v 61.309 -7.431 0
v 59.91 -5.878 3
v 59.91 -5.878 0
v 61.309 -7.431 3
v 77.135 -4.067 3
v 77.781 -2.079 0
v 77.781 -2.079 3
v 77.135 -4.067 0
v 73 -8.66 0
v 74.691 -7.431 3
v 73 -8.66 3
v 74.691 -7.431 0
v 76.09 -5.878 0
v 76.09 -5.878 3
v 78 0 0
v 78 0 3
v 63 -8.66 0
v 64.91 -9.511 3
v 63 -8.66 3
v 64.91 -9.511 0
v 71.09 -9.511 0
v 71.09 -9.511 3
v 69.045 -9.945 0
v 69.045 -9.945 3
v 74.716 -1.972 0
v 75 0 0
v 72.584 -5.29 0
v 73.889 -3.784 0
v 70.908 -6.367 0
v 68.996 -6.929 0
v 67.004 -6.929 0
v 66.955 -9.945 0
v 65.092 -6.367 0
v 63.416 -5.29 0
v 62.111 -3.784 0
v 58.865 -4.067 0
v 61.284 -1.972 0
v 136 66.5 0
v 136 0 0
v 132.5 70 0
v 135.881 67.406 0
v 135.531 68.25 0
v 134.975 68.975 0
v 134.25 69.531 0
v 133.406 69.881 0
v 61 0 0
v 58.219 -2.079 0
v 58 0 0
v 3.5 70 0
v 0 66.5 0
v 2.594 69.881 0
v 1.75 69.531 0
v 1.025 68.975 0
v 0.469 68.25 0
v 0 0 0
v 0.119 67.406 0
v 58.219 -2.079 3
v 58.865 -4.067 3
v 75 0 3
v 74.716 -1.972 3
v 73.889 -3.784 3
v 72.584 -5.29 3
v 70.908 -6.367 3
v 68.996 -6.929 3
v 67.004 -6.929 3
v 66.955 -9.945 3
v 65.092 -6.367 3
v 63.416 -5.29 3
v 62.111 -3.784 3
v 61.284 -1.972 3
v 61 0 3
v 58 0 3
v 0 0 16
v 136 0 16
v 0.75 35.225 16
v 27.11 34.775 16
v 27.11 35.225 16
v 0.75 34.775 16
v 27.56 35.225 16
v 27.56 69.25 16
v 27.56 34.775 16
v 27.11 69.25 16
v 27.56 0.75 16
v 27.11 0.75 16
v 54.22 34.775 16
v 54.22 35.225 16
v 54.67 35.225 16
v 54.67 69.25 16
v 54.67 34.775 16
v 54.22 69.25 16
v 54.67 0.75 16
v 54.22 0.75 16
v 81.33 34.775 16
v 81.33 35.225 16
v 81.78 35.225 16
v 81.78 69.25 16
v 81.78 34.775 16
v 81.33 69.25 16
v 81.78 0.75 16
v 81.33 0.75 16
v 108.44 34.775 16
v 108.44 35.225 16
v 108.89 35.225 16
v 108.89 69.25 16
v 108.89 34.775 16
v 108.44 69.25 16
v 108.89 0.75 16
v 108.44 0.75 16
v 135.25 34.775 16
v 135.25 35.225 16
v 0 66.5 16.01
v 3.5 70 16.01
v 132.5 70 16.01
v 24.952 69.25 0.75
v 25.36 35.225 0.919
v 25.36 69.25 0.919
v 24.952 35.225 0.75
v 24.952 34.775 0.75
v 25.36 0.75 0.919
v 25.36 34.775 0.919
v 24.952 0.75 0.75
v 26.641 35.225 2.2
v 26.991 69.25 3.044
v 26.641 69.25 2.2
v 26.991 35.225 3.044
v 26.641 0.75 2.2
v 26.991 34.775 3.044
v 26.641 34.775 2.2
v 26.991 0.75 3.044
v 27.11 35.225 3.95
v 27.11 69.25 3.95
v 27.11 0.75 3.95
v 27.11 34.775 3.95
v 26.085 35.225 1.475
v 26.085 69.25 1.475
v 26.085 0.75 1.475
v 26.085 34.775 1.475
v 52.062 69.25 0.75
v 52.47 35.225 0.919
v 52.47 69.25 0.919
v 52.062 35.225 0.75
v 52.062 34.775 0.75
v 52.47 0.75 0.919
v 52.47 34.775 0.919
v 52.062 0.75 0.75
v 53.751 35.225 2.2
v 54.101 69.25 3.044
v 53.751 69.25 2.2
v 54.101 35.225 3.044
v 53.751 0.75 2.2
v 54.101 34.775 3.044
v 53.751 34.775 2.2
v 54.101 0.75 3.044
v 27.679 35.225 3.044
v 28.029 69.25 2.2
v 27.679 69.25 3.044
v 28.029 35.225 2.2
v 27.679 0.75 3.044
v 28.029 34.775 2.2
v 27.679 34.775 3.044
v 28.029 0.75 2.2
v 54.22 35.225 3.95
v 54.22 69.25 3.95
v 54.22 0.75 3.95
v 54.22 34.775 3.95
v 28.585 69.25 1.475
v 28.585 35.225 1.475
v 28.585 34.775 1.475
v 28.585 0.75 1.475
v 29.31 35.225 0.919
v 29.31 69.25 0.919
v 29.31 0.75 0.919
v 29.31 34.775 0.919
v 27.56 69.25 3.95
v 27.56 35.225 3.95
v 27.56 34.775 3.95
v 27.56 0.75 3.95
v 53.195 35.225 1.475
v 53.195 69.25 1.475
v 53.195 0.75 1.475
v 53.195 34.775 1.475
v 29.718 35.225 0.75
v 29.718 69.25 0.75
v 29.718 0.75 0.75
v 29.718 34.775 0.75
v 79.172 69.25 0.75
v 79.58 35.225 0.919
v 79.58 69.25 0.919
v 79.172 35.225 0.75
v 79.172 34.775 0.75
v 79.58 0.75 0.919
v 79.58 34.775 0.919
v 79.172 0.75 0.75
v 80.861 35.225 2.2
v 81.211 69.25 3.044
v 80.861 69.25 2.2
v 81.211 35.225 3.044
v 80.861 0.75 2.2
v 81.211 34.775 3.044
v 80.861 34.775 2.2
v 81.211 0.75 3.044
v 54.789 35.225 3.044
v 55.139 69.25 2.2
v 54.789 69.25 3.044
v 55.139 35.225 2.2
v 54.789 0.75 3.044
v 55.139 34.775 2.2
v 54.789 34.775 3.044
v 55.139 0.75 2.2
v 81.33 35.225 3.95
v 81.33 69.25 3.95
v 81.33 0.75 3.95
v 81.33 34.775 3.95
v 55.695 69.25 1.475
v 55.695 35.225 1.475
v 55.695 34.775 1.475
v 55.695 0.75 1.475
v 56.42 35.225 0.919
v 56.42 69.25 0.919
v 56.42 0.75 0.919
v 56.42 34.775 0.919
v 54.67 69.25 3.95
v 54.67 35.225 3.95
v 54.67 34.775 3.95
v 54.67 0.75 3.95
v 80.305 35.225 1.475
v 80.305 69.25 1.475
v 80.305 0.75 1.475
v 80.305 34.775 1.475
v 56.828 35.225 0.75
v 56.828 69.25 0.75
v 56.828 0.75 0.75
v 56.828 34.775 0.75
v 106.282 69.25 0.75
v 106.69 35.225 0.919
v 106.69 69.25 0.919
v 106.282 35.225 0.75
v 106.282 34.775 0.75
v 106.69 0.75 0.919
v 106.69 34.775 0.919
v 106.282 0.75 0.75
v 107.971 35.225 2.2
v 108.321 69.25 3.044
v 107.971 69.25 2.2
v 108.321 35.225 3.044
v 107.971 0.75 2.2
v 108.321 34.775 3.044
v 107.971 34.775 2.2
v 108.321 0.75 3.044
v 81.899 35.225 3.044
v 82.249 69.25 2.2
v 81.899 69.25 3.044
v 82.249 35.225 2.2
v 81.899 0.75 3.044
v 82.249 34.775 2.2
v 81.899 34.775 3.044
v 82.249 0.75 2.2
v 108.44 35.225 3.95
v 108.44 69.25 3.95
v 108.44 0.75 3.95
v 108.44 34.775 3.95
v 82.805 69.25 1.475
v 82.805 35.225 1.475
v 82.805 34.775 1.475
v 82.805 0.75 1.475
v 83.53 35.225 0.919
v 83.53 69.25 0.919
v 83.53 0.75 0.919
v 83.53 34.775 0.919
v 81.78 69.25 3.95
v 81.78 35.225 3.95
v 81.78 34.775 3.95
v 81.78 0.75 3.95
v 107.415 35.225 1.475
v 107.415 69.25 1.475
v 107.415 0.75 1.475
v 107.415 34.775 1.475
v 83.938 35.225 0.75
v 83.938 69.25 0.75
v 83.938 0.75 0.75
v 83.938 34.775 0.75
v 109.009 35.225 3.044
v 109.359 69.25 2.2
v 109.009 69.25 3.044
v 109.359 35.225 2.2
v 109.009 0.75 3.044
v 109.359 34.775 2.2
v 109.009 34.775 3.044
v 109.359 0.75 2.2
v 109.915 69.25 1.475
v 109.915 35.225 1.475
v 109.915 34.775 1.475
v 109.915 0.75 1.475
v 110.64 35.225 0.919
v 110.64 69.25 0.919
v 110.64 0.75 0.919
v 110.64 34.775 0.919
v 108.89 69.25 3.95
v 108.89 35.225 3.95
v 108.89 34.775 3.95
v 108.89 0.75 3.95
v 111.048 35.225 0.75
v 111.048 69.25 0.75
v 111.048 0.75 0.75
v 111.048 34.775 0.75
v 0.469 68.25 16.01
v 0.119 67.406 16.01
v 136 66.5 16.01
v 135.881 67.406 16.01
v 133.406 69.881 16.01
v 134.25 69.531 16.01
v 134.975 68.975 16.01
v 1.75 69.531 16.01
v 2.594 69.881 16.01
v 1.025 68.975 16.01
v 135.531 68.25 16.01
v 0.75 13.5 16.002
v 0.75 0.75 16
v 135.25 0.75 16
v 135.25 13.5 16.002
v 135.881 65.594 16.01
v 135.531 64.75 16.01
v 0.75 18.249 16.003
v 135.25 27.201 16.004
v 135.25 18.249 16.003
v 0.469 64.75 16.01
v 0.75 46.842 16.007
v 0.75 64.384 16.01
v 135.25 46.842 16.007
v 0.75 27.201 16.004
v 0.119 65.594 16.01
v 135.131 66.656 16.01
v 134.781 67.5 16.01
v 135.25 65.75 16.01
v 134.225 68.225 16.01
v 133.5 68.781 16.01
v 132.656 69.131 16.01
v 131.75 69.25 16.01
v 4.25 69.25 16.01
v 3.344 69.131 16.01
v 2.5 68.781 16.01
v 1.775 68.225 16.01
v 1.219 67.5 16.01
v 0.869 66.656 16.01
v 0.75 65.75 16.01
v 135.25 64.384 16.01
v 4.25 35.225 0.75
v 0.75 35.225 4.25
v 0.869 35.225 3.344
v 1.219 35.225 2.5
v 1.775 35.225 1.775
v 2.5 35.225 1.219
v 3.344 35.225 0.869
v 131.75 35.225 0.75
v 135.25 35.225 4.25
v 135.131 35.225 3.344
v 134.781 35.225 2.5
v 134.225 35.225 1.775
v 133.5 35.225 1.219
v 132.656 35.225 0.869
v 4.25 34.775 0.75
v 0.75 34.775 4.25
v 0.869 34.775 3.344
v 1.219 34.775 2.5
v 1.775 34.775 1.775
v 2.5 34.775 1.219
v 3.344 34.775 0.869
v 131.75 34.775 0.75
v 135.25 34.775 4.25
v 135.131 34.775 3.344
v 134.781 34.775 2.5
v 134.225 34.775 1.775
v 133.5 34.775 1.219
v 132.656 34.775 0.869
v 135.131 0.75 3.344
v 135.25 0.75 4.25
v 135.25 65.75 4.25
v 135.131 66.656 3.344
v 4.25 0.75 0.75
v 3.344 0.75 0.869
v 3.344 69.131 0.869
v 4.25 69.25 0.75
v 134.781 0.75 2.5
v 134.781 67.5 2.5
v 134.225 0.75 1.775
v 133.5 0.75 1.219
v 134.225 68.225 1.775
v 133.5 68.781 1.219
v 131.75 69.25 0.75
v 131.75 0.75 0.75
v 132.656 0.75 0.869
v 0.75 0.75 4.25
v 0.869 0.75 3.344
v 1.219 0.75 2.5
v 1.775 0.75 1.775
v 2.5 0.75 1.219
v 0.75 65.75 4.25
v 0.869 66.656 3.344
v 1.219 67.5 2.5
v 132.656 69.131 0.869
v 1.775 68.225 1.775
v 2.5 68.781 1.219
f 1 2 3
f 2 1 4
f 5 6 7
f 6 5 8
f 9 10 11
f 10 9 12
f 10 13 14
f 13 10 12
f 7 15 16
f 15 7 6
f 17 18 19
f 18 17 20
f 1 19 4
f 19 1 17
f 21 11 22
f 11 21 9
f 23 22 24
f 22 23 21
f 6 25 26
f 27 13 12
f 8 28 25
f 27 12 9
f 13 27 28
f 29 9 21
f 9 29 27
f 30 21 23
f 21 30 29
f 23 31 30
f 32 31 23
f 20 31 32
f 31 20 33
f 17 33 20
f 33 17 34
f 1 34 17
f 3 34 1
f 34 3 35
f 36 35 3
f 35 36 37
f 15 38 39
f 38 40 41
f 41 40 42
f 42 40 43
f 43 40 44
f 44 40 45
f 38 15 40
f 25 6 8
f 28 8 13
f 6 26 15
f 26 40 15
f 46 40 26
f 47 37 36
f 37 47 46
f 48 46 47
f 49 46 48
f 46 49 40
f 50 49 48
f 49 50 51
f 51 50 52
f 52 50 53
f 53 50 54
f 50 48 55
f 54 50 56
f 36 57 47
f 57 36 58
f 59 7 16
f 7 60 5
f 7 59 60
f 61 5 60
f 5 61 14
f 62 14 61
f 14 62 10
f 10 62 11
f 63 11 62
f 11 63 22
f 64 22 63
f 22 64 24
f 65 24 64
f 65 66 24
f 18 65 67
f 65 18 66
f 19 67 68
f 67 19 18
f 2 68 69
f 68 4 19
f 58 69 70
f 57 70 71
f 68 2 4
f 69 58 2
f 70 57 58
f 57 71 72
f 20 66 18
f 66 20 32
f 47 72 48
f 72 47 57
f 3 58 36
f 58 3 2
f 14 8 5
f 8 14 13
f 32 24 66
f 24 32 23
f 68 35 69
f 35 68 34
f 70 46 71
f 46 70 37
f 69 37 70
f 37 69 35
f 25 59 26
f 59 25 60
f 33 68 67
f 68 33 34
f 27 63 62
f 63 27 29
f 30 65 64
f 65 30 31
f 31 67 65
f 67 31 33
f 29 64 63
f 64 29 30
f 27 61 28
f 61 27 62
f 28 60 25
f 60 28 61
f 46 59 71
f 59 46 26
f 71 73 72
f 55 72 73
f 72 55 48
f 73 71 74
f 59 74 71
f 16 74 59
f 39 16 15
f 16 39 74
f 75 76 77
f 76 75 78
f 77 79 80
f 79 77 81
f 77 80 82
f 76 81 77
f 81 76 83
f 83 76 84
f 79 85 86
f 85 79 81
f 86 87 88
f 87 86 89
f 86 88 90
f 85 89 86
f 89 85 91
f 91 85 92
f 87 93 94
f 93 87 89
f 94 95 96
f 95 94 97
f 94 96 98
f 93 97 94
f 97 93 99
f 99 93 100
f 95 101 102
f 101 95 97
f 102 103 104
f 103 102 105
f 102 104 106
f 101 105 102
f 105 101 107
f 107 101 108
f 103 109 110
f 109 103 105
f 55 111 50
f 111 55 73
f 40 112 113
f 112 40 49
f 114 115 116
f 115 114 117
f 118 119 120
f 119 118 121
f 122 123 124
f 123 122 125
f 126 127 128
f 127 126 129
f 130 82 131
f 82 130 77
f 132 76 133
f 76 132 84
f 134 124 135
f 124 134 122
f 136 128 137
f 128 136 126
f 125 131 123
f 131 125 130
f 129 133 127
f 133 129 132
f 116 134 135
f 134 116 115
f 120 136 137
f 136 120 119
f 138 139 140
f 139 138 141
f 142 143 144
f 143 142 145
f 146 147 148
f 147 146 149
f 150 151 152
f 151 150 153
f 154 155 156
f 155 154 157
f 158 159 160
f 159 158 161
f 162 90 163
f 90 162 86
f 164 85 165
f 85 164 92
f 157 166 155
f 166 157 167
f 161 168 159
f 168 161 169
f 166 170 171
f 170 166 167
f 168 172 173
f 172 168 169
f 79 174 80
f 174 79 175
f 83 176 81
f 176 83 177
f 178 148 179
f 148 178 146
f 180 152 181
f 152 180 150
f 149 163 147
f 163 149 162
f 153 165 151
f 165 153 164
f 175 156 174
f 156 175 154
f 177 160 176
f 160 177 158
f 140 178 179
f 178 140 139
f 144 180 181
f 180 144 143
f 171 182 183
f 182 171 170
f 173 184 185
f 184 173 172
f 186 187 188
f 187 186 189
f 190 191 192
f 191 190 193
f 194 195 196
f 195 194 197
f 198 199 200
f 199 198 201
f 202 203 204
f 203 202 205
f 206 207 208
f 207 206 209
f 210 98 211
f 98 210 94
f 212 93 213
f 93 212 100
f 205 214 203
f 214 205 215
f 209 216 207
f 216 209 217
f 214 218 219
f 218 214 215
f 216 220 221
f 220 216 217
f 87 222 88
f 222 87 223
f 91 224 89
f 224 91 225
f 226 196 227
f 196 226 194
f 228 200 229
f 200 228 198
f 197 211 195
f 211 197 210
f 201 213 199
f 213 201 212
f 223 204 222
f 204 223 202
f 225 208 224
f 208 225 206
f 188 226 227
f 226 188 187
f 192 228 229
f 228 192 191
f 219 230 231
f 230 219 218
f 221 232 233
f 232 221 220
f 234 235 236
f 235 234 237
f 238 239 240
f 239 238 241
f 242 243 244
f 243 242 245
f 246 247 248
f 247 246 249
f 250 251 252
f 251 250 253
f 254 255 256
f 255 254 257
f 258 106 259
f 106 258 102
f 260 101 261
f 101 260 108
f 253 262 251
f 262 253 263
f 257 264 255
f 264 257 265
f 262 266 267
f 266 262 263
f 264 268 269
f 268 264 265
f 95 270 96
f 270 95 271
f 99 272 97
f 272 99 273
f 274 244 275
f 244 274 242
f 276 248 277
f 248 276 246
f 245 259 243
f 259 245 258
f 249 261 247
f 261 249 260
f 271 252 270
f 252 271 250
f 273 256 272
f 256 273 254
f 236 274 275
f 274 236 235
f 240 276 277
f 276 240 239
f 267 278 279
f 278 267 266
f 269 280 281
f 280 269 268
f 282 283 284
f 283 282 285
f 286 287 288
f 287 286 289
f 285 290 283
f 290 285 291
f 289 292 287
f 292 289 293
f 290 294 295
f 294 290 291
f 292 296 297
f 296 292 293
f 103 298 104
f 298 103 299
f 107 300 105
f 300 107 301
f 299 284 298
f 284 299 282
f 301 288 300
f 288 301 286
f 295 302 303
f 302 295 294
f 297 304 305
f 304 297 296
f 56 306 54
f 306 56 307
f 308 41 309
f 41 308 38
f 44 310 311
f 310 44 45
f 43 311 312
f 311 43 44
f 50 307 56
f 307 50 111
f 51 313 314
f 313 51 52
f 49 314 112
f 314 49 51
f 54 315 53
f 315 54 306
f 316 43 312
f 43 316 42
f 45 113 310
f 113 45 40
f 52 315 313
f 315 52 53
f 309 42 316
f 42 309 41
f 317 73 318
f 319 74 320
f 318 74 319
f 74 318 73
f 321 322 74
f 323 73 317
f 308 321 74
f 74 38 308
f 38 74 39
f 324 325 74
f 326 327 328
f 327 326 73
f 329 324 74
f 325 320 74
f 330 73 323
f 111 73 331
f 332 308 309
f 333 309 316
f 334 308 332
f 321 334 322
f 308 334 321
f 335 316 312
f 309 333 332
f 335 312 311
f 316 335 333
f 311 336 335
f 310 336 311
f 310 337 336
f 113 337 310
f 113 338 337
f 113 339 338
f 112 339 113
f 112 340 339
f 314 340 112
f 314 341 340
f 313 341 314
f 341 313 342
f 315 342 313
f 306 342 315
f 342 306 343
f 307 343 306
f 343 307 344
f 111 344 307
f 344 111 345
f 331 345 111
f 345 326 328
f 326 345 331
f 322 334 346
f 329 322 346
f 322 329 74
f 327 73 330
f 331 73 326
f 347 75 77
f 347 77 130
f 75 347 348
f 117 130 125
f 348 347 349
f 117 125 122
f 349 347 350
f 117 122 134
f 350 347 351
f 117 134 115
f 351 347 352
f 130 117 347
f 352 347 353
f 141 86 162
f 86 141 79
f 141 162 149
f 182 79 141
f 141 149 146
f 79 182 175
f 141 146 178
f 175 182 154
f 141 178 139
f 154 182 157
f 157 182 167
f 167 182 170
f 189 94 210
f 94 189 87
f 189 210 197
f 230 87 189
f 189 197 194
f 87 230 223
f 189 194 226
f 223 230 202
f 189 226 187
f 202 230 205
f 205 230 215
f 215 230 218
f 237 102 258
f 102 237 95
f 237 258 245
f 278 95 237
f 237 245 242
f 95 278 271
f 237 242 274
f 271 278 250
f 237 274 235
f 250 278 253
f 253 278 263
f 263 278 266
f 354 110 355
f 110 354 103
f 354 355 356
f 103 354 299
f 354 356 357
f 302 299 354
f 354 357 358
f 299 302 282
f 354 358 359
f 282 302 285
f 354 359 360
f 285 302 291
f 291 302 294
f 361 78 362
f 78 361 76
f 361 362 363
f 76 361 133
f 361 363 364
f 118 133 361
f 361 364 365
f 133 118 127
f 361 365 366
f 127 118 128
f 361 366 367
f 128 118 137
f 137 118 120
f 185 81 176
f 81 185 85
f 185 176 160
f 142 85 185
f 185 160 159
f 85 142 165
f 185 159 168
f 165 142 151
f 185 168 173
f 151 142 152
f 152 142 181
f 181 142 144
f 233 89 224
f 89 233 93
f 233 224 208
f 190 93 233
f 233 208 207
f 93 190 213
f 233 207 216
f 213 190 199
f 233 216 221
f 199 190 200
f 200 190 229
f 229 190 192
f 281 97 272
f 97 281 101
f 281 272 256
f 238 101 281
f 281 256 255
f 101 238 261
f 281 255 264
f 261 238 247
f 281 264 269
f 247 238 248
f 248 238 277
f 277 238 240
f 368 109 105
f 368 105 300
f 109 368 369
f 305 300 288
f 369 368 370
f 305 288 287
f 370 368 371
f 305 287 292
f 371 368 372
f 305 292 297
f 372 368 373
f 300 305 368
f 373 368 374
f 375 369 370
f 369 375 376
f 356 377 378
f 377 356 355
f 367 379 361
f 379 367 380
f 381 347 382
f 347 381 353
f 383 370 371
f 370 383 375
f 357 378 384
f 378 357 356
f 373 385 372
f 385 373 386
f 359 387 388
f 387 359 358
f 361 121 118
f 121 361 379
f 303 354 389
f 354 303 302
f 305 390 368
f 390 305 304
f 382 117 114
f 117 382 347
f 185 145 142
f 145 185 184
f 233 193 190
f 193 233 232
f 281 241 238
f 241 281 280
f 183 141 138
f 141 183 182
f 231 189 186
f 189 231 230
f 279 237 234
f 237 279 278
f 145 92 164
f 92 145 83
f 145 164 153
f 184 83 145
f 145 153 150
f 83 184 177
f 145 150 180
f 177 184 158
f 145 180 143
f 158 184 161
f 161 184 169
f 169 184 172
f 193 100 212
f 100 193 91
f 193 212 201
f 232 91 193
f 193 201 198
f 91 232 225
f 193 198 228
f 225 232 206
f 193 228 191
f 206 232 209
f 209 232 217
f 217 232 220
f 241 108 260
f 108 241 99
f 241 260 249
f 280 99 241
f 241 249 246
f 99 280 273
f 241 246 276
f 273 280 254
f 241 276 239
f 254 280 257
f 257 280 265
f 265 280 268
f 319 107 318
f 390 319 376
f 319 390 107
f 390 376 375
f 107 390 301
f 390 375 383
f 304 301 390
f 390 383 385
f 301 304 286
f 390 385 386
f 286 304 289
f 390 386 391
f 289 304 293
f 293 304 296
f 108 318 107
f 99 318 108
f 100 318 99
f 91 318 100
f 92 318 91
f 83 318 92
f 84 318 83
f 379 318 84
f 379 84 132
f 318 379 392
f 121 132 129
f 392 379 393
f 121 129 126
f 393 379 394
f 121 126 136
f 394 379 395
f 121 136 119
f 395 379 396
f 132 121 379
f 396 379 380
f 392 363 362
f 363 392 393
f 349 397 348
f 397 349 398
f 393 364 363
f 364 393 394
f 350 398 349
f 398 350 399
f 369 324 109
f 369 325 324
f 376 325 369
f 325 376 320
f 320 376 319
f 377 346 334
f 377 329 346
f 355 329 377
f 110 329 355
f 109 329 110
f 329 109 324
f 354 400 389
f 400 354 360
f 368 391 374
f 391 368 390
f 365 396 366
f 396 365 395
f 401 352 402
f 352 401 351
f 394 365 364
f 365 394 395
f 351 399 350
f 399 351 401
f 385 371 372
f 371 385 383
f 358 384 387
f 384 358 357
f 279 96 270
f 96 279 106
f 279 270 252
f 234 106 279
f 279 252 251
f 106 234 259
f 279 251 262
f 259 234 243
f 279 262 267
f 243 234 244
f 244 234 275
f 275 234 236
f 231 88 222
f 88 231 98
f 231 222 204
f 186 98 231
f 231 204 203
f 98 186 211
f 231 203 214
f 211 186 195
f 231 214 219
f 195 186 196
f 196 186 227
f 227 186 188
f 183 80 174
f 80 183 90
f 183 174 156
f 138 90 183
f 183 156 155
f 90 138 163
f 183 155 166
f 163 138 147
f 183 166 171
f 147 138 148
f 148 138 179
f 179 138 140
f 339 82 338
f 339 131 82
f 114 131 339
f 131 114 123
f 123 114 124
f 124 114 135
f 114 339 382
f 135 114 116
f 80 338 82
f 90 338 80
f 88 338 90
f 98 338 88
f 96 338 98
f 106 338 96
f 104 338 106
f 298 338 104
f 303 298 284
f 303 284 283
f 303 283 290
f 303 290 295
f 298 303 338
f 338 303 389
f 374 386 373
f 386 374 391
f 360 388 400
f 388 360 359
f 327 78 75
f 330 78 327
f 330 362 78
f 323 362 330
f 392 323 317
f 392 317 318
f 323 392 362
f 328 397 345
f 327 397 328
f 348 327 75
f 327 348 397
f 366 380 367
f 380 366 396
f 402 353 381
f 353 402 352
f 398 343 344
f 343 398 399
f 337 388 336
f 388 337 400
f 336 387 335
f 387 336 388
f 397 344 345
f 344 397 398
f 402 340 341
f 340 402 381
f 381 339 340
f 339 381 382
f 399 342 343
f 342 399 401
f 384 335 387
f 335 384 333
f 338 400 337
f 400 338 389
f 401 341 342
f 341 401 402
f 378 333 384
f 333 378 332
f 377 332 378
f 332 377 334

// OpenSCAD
numberOfDrawerCompartmentsHorizontally = 5;
numberOfDrawerCompartmentsInDepth = 2;

// You can subdivide the drawer into two types of compartments by setting the right side width ratio to something bigger than zero.
rightSideWidthRatio = 0;
rightSideNumberOfDrawerCompartmentsHorizontally = 3;
rightSideNumberOfDrawerCompartmentsInDepth = 2;

numberOfDrawersInChest = 7;

generate = 1; // [0:chest, 1:drawer]

// Thickness
outerWall = 0.75;
// Thickness of main drawer walls and dividers running forward and back
drawerWall=0.45;
// Thickness of divider walls running horizontally
dividerWall=0.45;
drawerWidth = 136;
drawerDepth = 70;
drawerHeight = 16;
roundedCornerRadius=3.5;

tolerance=0.75;

// Divider walls between full-depth compartments can have a cut in them to make it easier to put things in and take them out. Set cut height to zero to disable.
cutHeight = 13.5;
cutLengthAtTop = 16;
cutLengthAtBottom = 8;
cutSmoothingSize = 5;

handleSize = 20;
handleLip = 3;
// Set to zero to have a handle with no floor.
handleFloorThickness = 0;

slideWidth = 6;
slideThickness = 1;

// Three of the walls are made in a grid pattern to save plastic. If you want them solid, set the grid hole width to zero.
gridHoleWidth = 9;
gridStripWidth = 3;
gridAngle = 60;

numberOfRearCrossbars = 2; // [0:0, 1:1, 2:2]


module end_of_parameters_dummy() {}

//use <Bezier.scad>;
/*
Copyright (c) 2017 Alexander R. Pruss.

Licensed under any Creative Commons Attribution license you like or under the
following MIT License.

Permission is hereby granted, free of charge, to any person obtaining a copy
of this software and associated documentation files (the "Software"), to deal
in the Software without restriction, including without limitation the rights
to use, copy, modify, merge, publish, distribute, sublicense, and/or sell
copies of the Software, and to permit persons to whom the Software is
furnished to do so, subject to the following conditions:

The above copyright notice and this permission notice shall be included in all
copies or substantial portions of the Software.

THE SOFTWARE IS PROVIDED "AS IS", WITHOUT WARRANTY OF ANY KIND, EXPRESS OR
IMPLIED, INCLUDING BUT NOT LIMITED TO THE WARRANTIES OF MERCHANTABILITY,
FITNESS FOR A PARTICULAR PURPOSE AND NONINFRINGEMENT. IN NO EVENT SHALL THE
AUTHORS OR COPYRIGHT HOLDERS BE LIABLE FOR ANY CLAIM, DAMAGES OR OTHER
LIABILITY, WHETHER IN AN ACTION OF CONTRACT, TORT OR OTHERWISE, ARISING FROM,
OUT OF OR IN CONNECTION WITH THE SOFTWARE OR THE USE OR OTHER DEALINGS IN THE
SOFTWARE.

*/


// Public domain Bezier stuff from www.thingiverse.com/thing:8443
function BEZ03(u) = pow((1-u), 3);
function BEZ13(u) = 3*u*(pow((1-u),2));
function BEZ23(u) = 3*(pow(u,2))*(1-u);
function BEZ33(u) = pow(u,3);
function PointAlongBez4(p0, p1, p2, p3, u) = [for (i=[0:len(p0)-1])
	BEZ03(u)*p0[i]+BEZ13(u)*p1[i]+BEZ23(u)*p2[i]+BEZ33(u)*p3[i]];
// End public domain Bezier stuff

function REPEAT_MIRRORED(v) = ["m",v];
function SMOOTH_REL(x) = ["r",x];
function SMOOTH_ABS(x) = ["a",x];
function SYMMETRIC() = ["r",1];
function OFFSET(v) = ["o",v];
function SHARP() = OFFSET([0,0,0]);
function POLAR(r,angle) = OFFSET(r*[cos(angle),sin(angle)]);
function POINT_IS_SPECIAL(v) = (v[0]=="r" || v[0]=="a" || v[0]=="o");

// this does NOT handle offset type points; to handle those, use DecodeBezierOffsets()
function getControlPoint(cp,node,otherCP) = cp[0]=="r"?(node+cp[1]*(node-otherCP)):( cp[0]=="a"?node+cp[1]*(node-otherCP)/norm(node-otherCP):cp );

function onLine2(a,b,c,eps=1e-4) =
    norm(c-a) <= eps ? true
        : norm(b-a) <= eps ? false /* to be safe */
            : abs((c[1]-a[1])*(b[0]-a[0]) - (b[1]-a[1])*(c[0]-a[0])) <= eps * eps && norm(c-a) <= eps + norm(b-a);

function isStraight2(p1,c1,c2,p2,eps=1e-4) =
    len(p1) == 2 &&
    onLine2(p1,p2,c1,eps=eps) && onLine2(p2,p1,c2,eps=eps);

function Bezier2(p,index=0,precision=0.05,rightEndPoint=true) = let(nPoints=ceil(1/precision))
    isStraight2(p[index],p[index+1],p[index+2],p[index+3]) ? (rightEndPoint?[p[index+0],p[index+3]]:[p[index+0]] ) :
    [for (i=[0:nPoints-(rightEndPoint?0:1)]) PointAlongBez4(p[index+0],p[index+1],p[index+2],p[index+3],i/nPoints)];

function flatten(listOfLists) = [ for(list = listOfLists) for(item = list) item ];


// p is a list of points, in the format:
// [node1,control1,control2,node2,control3, control4,node3, ...]
// You can replace inner control points with:
//   SYMMETRIC: uses a reflection of the control point on the other side of the node
//   SMOOTH_REL(x): like SYMMETRIC, but the distance of the control point to the node is x times the distance of the other control point to the node
//   SMOOTH_ABS(x): like SYMMETRIC, but the distance of the control point to the node is exactly x
// You can also replace any control point with:
//   OFFSET(v): puts the control point at the corresponding node plus the vector v
//   SHARP(): equivalent to OFFSET([0,0]); useful for straight lines
//   POLAR(r,angle): like OFFSET, except the offset is specified in polar coordinates

function DecodeBezierOffset(control,node) = control[0] == "o" ? node+control[1] : control;

function _mirrorMatrix(normalVector) = let(v = normalVector/norm(normalVector)) len(v)<3 ? [[1-2*v[0]*v[0],-2*v[0]*v[1]],[-2*v[0]*v[1],1-2*v[1]*v[1]]] : [[1-2*v[0]*v[0],-2*v[0]*v[1],-2*v[0]*v[2]],[-2*v[0]*v[1],1-2*v[1]*v[1],-2*v[1]*v[2]],[-2*v[0]*v[2],-2*v[1]*v[2],1-2*v[2]*v[2]]];

function _correctLength(p,start=0) =
    start >= len(p) || p[start][0] == "m" ? 3*floor(start/3)+1 : _correctLength(p,start=start+1);

function _trimArray(a, n) = [for (i=[0:n-1]) a[i]];

function _transformPoint(matrix,a) =
    let(n=len(a))
        len(matrix[0])==n+1 ?
            _trimArray(matrix * concat(a,[1]), n)
            : matrix * a;

function _transformPath(matrix,path) =
    [for (a=path) _transformPoint(matrix,a)];

function _reverseArray(array) = let(n=len(array)) [for (i=[0:n-1]) array[n-1-i]];

function _stitchPaths(a,b) = let(na=len(a)) [for (i=[0:na+len(b)-2]) i<na? a[i] : b[i-na+1]-b[0]+a[na-1]];

// replace all OFFSET/SHARP/POLAR points with coordinates
function DecodeBezierOffsets(p) = [for (i=[0:_correctLength(p)-1]) i%3==0?p[i]:(i%3==1?DecodeBezierOffset(p[i],p[i-1]):DecodeBezierOffset(p[i],p[i+1]))];

function _mirrorPaths(basePath, control, start) =
    control[start][0] == "m" ? _mirrorPaths(_stitchPaths(basePath,_reverseArray(_transformPath(_mirrorMatrix( control[start][1] ),basePath))), control, start+1) : basePath;

function DecodeSpecialBezierPoints(p0) =
    let(
        l = _correctLength(p0),
        doMirror = len(p0)>l && p0[l][0] == "m",
        p=DecodeBezierOffsets(p0),
        basePath = [for (i=[0:l-1]) i%3==0?p[i]:(i%3==1?getControlPoint(p[i],p[i-1],p[i-2]):getControlPoint(p[i],p[i+1],p[i+2]))])
        doMirror ? _mirrorPaths(basePath, p0, l) : basePath;

function Distance2D(a,b) = sqrt((a[0]-b[0])*(a[0]-b[0])+(a[1]-b[1])*(a[1]-b[1]));

function RemoveDuplicates(p,eps=0.00001) = let(safeEps = eps/len(p)) [for (i=[0:len(p)-1]) if(i==0 || i==len(p)-1 || Distance2D(p[i-1],p[i]) >= safeEps) p[i]];

function Bezier(p,precision=0.05,eps=0.00001) = let(q=DecodeSpecialBezierPoints(p), nodes=(len(q)-1)/3) RemoveDuplicates(flatten([for (i=[0:nodes-1]) Bezier2(q,index=i*3,precision=precision,rightEndPoint=(i==nodes-1))]),eps=eps);

module BezierVisualize(p,precision=0.05,eps=0.00001,lineThickness=0.25,controlLineThickness=0.125,nodeSize=1) {
    $fn = 16;
    dim = len(p[0]);
    module point(size) {
        if (dim==2)
            circle(d=size);
        else
            sphere(d=size);
    }
    p1 = DecodeSpecialBezierPoints(p);
    l = Bezier(p1,precision=precision,eps=eps);
    for (i=[0:len(l)-2]) {
        hull() {
            translate(l[i]) point(lineThickness);
            translate(l[i+1]) point(lineThickness);
        }
    }
    for (i=[0:len(p1)-1]) {
        if (i%3 == 0) {
            color("black") translate(p1[i]) point(nodeSize);
        }
        else {
            node = i%3 == 1 ? i-1 : i+1;
            color("red") translate(p1[i]) point(nodeSize);
            color("red") hull() {
                translate(p1[node]) point(controlLineThickness);
                translate(p1[i]) point(controlLineThickness);
            }
        }
    }
}



module dummy() {}
nudge = 0.01;

module compartment(width, drawerDepth, drawerHeight,drawerWall=drawerWall) {
    render(convexity=2)
    difference() {
        cube([width,drawerDepth,drawerHeight]);
        hull() {
            translate([drawerWall,drawerWall,roundedCornerRadius+drawerWall]) cube([width-2*drawerWall,drawerDepth-2*drawerWall,drawerHeight]);
            translate([0,drawerWall,roundedCornerRadius+drawerWall])
                rotate([-90,0,0]) {
                translate([drawerWall+roundedCornerRadius,0,0]) cylinder(h=drawerDepth-2*drawerWall,r=roundedCornerRadius,$fn=24);
                translate([width-drawerWall-roundedCornerRadius,0,0]) cylinder(h=drawerDepth-2*drawerWall,r=roundedCornerRadius,$fn=24);
                }
            }
    }
}

module drawerHull(drawerWidth,inset=0,drawerHeight=drawerHeight,roundOnLeft=true,roundOnRight=true) {

    module post(roundPost) {
       if (roundPost)
           cylinder(h=drawerHeight+nudge,r=roundedCornerRadius,$fn=24);
       else
           translate([-roundedCornerRadius,-roundedCornerRadius,0]) cube([roundedCornerRadius*2,roundedCornerRadius*2,drawerHeight+nudge]);
    }

        hull() {
            translate([inset+roundedCornerRadius,drawerDepth-roundedCornerRadius-inset])
            post(roundOnLeft);
    translate([drawerWidth-roundedCornerRadius-inset,drawerDepth-roundedCornerRadius-inset]) post(roundOnRight);
    translate([inset,inset,0]) cube([roundedCornerRadius,roundedCornerRadius,drawerHeight]);
    translate([drawerWidth-inset-roundedCornerRadius,inset,0]) cube([roundedCornerRadius,roundedCornerRadius,drawerHeight]);
        }
}

module baseDrawer(numberOfDrawerCompartmentsHorizontally, drawerWidth, roundOnLeft=true, roundOnRight=true, drawerWall=drawerWall) {
    compartmentWidth = (drawerWidth-drawerWall)/numberOfDrawerCompartmentsHorizontally+drawerWall;

    intersection() {
        union() {
            for (i=[0:numberOfDrawerCompartmentsHorizontally-1]) {
                translate([(compartmentWidth-drawerWall)*i,0,0])
                compartment(compartmentWidth,drawerDepth,drawerHeight, drawerWall=drawerWall);
            }
        }
        drawerHull(drawerWidth,roundOnLeft=roundOnLeft,roundOnRight=roundOnRight);
    }
    render(convexity=2)
    difference() {
        drawerHull(drawerWidth,roundOnLeft=roundOnLeft,roundOnRight=roundOnRight);
        drawerHull(drawerWidth,roundOnLeft=roundOnLeft,roundOnRight=roundOnRight,inset=drawerWall,drawerHeight=drawerHeight+nudge);
    }
}

module cut() {
 //polygon([[-cutHeight,-cutLengthAtTop/2],[0,-cutLengthAtBottom/2],[0,cutLengthAtBottom/2],[-cutHeight,cutLengthAtTop/2]]);
    polygon(Bezier([ [-cutHeight,-cutLengthAtTop/2-cutSmoothingSize],OFFSET([0,cutSmoothingSize]), OFFSET([0,-cutSmoothingSize]),
    [nudge,-cutLengthAtBottom/2],
    OFFSET([0,0]),
    OFFSET([0,0]),
    [nudge,0], REPEAT_MIRRORED([0,1])
    ]));

}

module handle() {
    render(convexity=2)
    translate([drawerWidth/2,0,0])
    difference() {
        cylinder(d=handleSize,h=handleFloorThickness+handleLip);
        translate([0,0,handleFloorThickness-nudge]) cylinder(d=handleSize-handleLip*2,h=handleLip+2*nudge);
        translate([-handleSize/2,0,0]) cube([handleSize,handleSize,handleSize]);
    }
}

module drawer(numberOfDrawerCompartmentsHorizontally, numberOfDrawerCompartmentsInDepth, drawerWidth, roundOnLeft=true, roundOnRight=true, drawerWall=drawerWall) {

    compartmentWidth = (drawerWidth-drawerWall)/numberOfDrawerCompartmentsHorizontally+drawerWall;

    render(convexity=4)
    difference() {
        baseDrawer(numberOfDrawerCompartmentsHorizontally, drawerWidth, roundOnLeft=roundOnLeft, roundOnRight=roundOnRight, drawerWall=drawerWall);
        if (numberOfDrawerCompartmentsInDepth == 1)
        translate([compartmentWidth/2,drawerDepth/2,drawerHeight-cutHeight+nudge])
        rotate([0,90,0]) linear_extrude(height=drawerWidth-compartmentWidth) cut();
    }
    if (numberOfDrawerCompartmentsInDepth > 1) {
        for (i=[0:numberOfDrawerCompartmentsInDepth-2]) {
            translate([0,drawerWall+(drawerDepth-2*drawerWall)/numberOfDrawerCompartmentsInDepth*(1+i)-dividerWall/2,0])
            cube([drawerWidth,dividerWall,drawerHeight]);
        }
    }
}

chestWidth = drawerWidth+2*outerWall+2*tolerance;
drawerSpacing = drawerHeight+2*tolerance+slideThickness;
chestHeight = drawerSpacing*numberOfDrawersInChest+2*outerWall;
chestDepth = drawerDepth+tolerance+outerWall;

module strips(width,drawerDepth) {
    n = floor(1+width/(gridStripWidth+gridHoleWidth));
    for (i=[0:n]) {
        translate([i*(gridStripWidth+gridHoleWidth),0,0]) square([gridStripWidth,drawerDepth]);
    }
}

module gridFace(width,drawerDepth) {
    stripLength = 1.5*(width+drawerDepth);
    intersection() {
        union() {
            rotate(-gridAngle/2) translate([-stripLength/2,-stripLength/2])
            strips(stripLength,stripLength);
            rotate(gridAngle/2) translate([-stripLength/2,-stripLength/2])
            strips(stripLength,stripLength);
        }
        square([width,drawerDepth]);
    }
    difference() {
        square([width,drawerDepth]);
        translate([gridStripWidth,gridStripWidth])
        square([width-gridStripWidth*2,drawerDepth-gridStripWidth*2]);
    }
}

module drawerSupport(bottom,top) {
    cube([slideWidth,chestDepth,slideThickness]);
    translate([chestWidth-slideWidth,0,0]) cube([slideWidth,chestDepth,slideThickness]);
    translate([0,chestDepth-slideWidth,0]) cube([chestWidth,slideWidth,slideThickness*2/3]);

    if (!bottom) {
        translate([0,0,-slideWidth/2+slideThickness/2])
        cube([outerWall,chestDepth,slideWidth]);
        translate([chestWidth-outerWall,0,-slideWidth/2+slideThickness/2])
        cube([outerWall,chestDepth,slideWidth]);
    }
}

module chest(numberOfDrawersInChest) {
    render(convexity=8) {
        linear_extrude(height=outerWall)
        gridFace(chestWidth,chestDepth);
        translate([0,0,chestHeight-outerWall]) cube([chestWidth,chestDepth,outerWall]);
        translate([outerWall,0,0]) rotate([0,-90,0])
        linear_extrude(height=outerWall)
        gridFace(chestHeight,chestDepth);
        translate([chestWidth,0,0]) rotate([0,-90,0])
        linear_extrude(height=outerWall)
        gridFace(chestHeight,chestDepth,outerWall);
        for (i=[0:numberOfDrawersInChest-1]) {
            translate([0,0,outerWall+i*drawerSpacing]) drawerSupport(i==0);
        }
        for (i=[1:numberOfDrawersInChest-1]) {
            translate([0,chestDepth-outerWall,outerWall+i*drawerSpacing-slideWidth/2+slideThickness/2]) cube([chestWidth,outerWall,slideWidth]);
        }
            translate([0,chestDepth-outerWall,0]) cube([chestWidth,outerWall,slideWidth/2]);
            translate([0,chestDepth-outerWall,chestHeight-slideWidth/2]) cube([chestWidth,outerWall,slideWidth/2]);
    }
    if (numberOfRearCrossbars > 0) {
        angle = atan2(chestHeight,chestWidth);
        translate([0,chestDepth,0])
        rotate([90,0,0])
        linear_extrude(height=outerWall)
        intersection() {
            union() {
                rotate(angle)
                translate([-0.5*(chestHeight+chestDepth),0]) square([2*(chestHeight+chestDepth),slideWidth]);
                if (numberOfRearCrossbars > 1)
                translate([0,chestHeight])
                rotate(-angle)
                translate([-0.5*(chestHeight+chestDepth),0]) square([2*(chestHeight+chestDepth),slideWidth]);
            }
            square([chestWidth,chestHeight]);
        }
    }
}

module fullDrawer() {
    handle();
    if (rightSideWidthRatio>0) {
        leftWidth = drawerWidth * (1-rightSideWidthRatio) + drawerWall/2;
        rightWidth = drawerWidth * rightSideWidthRatio + drawerWall/2;
        drawer(numberOfDrawerCompartmentsHorizontally, numberOfDrawerCompartmentsInDepth, leftWidth, roundOnRight=false);
        translate([leftWidth-drawerWall,0,0])
            drawer(rightSideNumberOfDrawerCompartmentsHorizontally, rightSideNumberOfDrawerCompartmentsInDepth, rightWidth, roundOnLeft=false);
    }
    else {
        drawer(numberOfDrawerCompartmentsHorizontally, numberOfDrawerCompartmentsInDepth, drawerWidth);
    }

    if (outerWall > drawerWall)
        drawer(1,1,drawerWidth,drawerWall=outerWall);
}

if (generate == 1) {
    fullDrawer();
}
else
    rotate([-90,0,0])
    chest(numberOfDrawersInChest);
